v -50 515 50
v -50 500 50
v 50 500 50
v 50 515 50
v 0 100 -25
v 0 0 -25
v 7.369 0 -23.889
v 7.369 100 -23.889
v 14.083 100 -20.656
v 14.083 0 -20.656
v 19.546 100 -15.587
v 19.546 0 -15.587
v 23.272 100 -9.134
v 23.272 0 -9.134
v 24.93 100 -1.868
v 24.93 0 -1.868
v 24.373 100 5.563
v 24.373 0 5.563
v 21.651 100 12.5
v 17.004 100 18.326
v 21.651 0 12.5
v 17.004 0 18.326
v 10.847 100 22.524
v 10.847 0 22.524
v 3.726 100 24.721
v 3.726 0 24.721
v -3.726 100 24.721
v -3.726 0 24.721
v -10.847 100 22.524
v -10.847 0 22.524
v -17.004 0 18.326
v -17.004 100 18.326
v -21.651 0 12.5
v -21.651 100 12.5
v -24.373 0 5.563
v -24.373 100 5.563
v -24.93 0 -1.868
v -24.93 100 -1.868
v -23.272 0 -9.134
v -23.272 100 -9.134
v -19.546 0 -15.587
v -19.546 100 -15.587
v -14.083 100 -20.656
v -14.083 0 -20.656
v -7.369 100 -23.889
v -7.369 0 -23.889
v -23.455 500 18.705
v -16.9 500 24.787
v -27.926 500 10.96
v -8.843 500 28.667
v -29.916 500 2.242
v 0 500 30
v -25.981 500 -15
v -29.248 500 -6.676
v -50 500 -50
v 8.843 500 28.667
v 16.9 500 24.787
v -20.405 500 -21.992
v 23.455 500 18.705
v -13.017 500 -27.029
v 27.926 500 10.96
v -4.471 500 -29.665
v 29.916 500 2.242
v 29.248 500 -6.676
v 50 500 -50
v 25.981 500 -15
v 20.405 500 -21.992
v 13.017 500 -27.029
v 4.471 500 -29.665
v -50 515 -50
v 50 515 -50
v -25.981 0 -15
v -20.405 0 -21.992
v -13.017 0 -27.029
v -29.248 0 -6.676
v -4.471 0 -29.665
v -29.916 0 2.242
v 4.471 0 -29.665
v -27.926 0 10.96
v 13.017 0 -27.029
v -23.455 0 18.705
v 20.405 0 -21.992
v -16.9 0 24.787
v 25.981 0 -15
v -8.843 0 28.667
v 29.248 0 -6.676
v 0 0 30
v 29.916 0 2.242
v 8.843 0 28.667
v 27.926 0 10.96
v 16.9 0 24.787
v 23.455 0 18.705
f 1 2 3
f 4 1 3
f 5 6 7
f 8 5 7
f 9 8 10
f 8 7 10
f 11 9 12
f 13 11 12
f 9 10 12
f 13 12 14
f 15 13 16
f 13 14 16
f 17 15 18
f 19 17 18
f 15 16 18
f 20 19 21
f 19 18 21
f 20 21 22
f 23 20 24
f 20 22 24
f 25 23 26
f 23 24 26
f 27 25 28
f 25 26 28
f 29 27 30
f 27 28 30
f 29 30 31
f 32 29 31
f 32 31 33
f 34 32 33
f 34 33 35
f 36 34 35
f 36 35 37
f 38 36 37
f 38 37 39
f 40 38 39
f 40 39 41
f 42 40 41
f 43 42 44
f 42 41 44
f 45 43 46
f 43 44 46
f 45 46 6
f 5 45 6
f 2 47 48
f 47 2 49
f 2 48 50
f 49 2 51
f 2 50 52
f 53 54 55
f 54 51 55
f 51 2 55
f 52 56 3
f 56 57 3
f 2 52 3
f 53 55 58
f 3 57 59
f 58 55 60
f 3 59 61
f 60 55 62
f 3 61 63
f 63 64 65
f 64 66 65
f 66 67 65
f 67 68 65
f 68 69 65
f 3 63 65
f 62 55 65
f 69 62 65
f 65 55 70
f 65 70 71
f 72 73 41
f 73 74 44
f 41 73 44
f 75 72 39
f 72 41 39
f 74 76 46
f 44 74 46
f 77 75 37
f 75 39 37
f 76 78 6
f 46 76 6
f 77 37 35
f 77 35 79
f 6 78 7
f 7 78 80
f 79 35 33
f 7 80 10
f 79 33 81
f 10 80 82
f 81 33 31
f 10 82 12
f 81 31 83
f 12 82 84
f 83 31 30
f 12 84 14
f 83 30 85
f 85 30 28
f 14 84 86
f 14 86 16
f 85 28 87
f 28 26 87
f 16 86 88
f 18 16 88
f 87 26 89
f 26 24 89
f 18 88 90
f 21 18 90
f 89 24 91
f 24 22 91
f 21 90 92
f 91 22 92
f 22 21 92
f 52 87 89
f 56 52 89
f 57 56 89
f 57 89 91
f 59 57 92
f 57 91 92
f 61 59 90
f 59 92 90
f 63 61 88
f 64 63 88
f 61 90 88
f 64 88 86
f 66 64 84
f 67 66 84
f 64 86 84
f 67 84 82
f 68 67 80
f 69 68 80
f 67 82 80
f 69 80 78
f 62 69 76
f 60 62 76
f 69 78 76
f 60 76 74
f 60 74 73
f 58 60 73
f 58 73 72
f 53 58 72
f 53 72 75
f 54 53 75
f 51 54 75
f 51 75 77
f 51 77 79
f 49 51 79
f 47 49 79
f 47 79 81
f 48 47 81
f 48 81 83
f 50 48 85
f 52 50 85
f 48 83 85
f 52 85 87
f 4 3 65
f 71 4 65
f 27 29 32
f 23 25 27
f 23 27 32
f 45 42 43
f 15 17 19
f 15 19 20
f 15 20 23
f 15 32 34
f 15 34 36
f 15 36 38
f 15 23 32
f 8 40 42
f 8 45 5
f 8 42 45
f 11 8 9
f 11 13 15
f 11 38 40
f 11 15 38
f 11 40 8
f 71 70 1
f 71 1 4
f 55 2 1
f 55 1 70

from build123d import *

# Parameters (mm, degrees)
SKETCH1_R           = 30
BOSS_EXTRUDE1_DEPTH = 500
SKETCH2_R           = 25
CUT_EXTRUDE1_DEPTH  = 100
SKETCH3_W           = 100
SKETCH3_H           = 100
BOSS_EXTRUDE2_DEPTH = 15


with BuildPart() as part:
    # Sketch1 → Boss-Extrude1 (new body)
    with BuildSketch(Plane(origin=(0, 0, 0), x_dir=(1, 0, 0), z_dir=(0, 1, 0))):
        with Locations(Location((0, 0, 0), (0, 0, 270))):
            Circle(SKETCH1_R)
    extrude(amount=BOSS_EXTRUDE1_DEPTH)

    # Sketch2 → Cut-Extrude1 (cut)
    with BuildSketch(Plane(origin=(0, 0, 0), x_dir=(-1, 0, 0), z_dir=(0, -1, 0))):
        with Locations(Location((0, 0, 0), (0, 0, 90))):
            Circle(SKETCH2_R)
    extrude(amount=-CUT_EXTRUDE1_DEPTH, mode=Mode.SUBTRACT)

    # Sketch3 → Boss-Extrude2 (add)
    with BuildSketch(Plane(origin=(0, 500, 0), x_dir=(1, 0, 0), z_dir=(0, 1, 0))):
        Rectangle(SKETCH3_W, SKETCH3_H)
    extrude(amount=BOSS_EXTRUDE2_DEPTH)


solid = part.part
